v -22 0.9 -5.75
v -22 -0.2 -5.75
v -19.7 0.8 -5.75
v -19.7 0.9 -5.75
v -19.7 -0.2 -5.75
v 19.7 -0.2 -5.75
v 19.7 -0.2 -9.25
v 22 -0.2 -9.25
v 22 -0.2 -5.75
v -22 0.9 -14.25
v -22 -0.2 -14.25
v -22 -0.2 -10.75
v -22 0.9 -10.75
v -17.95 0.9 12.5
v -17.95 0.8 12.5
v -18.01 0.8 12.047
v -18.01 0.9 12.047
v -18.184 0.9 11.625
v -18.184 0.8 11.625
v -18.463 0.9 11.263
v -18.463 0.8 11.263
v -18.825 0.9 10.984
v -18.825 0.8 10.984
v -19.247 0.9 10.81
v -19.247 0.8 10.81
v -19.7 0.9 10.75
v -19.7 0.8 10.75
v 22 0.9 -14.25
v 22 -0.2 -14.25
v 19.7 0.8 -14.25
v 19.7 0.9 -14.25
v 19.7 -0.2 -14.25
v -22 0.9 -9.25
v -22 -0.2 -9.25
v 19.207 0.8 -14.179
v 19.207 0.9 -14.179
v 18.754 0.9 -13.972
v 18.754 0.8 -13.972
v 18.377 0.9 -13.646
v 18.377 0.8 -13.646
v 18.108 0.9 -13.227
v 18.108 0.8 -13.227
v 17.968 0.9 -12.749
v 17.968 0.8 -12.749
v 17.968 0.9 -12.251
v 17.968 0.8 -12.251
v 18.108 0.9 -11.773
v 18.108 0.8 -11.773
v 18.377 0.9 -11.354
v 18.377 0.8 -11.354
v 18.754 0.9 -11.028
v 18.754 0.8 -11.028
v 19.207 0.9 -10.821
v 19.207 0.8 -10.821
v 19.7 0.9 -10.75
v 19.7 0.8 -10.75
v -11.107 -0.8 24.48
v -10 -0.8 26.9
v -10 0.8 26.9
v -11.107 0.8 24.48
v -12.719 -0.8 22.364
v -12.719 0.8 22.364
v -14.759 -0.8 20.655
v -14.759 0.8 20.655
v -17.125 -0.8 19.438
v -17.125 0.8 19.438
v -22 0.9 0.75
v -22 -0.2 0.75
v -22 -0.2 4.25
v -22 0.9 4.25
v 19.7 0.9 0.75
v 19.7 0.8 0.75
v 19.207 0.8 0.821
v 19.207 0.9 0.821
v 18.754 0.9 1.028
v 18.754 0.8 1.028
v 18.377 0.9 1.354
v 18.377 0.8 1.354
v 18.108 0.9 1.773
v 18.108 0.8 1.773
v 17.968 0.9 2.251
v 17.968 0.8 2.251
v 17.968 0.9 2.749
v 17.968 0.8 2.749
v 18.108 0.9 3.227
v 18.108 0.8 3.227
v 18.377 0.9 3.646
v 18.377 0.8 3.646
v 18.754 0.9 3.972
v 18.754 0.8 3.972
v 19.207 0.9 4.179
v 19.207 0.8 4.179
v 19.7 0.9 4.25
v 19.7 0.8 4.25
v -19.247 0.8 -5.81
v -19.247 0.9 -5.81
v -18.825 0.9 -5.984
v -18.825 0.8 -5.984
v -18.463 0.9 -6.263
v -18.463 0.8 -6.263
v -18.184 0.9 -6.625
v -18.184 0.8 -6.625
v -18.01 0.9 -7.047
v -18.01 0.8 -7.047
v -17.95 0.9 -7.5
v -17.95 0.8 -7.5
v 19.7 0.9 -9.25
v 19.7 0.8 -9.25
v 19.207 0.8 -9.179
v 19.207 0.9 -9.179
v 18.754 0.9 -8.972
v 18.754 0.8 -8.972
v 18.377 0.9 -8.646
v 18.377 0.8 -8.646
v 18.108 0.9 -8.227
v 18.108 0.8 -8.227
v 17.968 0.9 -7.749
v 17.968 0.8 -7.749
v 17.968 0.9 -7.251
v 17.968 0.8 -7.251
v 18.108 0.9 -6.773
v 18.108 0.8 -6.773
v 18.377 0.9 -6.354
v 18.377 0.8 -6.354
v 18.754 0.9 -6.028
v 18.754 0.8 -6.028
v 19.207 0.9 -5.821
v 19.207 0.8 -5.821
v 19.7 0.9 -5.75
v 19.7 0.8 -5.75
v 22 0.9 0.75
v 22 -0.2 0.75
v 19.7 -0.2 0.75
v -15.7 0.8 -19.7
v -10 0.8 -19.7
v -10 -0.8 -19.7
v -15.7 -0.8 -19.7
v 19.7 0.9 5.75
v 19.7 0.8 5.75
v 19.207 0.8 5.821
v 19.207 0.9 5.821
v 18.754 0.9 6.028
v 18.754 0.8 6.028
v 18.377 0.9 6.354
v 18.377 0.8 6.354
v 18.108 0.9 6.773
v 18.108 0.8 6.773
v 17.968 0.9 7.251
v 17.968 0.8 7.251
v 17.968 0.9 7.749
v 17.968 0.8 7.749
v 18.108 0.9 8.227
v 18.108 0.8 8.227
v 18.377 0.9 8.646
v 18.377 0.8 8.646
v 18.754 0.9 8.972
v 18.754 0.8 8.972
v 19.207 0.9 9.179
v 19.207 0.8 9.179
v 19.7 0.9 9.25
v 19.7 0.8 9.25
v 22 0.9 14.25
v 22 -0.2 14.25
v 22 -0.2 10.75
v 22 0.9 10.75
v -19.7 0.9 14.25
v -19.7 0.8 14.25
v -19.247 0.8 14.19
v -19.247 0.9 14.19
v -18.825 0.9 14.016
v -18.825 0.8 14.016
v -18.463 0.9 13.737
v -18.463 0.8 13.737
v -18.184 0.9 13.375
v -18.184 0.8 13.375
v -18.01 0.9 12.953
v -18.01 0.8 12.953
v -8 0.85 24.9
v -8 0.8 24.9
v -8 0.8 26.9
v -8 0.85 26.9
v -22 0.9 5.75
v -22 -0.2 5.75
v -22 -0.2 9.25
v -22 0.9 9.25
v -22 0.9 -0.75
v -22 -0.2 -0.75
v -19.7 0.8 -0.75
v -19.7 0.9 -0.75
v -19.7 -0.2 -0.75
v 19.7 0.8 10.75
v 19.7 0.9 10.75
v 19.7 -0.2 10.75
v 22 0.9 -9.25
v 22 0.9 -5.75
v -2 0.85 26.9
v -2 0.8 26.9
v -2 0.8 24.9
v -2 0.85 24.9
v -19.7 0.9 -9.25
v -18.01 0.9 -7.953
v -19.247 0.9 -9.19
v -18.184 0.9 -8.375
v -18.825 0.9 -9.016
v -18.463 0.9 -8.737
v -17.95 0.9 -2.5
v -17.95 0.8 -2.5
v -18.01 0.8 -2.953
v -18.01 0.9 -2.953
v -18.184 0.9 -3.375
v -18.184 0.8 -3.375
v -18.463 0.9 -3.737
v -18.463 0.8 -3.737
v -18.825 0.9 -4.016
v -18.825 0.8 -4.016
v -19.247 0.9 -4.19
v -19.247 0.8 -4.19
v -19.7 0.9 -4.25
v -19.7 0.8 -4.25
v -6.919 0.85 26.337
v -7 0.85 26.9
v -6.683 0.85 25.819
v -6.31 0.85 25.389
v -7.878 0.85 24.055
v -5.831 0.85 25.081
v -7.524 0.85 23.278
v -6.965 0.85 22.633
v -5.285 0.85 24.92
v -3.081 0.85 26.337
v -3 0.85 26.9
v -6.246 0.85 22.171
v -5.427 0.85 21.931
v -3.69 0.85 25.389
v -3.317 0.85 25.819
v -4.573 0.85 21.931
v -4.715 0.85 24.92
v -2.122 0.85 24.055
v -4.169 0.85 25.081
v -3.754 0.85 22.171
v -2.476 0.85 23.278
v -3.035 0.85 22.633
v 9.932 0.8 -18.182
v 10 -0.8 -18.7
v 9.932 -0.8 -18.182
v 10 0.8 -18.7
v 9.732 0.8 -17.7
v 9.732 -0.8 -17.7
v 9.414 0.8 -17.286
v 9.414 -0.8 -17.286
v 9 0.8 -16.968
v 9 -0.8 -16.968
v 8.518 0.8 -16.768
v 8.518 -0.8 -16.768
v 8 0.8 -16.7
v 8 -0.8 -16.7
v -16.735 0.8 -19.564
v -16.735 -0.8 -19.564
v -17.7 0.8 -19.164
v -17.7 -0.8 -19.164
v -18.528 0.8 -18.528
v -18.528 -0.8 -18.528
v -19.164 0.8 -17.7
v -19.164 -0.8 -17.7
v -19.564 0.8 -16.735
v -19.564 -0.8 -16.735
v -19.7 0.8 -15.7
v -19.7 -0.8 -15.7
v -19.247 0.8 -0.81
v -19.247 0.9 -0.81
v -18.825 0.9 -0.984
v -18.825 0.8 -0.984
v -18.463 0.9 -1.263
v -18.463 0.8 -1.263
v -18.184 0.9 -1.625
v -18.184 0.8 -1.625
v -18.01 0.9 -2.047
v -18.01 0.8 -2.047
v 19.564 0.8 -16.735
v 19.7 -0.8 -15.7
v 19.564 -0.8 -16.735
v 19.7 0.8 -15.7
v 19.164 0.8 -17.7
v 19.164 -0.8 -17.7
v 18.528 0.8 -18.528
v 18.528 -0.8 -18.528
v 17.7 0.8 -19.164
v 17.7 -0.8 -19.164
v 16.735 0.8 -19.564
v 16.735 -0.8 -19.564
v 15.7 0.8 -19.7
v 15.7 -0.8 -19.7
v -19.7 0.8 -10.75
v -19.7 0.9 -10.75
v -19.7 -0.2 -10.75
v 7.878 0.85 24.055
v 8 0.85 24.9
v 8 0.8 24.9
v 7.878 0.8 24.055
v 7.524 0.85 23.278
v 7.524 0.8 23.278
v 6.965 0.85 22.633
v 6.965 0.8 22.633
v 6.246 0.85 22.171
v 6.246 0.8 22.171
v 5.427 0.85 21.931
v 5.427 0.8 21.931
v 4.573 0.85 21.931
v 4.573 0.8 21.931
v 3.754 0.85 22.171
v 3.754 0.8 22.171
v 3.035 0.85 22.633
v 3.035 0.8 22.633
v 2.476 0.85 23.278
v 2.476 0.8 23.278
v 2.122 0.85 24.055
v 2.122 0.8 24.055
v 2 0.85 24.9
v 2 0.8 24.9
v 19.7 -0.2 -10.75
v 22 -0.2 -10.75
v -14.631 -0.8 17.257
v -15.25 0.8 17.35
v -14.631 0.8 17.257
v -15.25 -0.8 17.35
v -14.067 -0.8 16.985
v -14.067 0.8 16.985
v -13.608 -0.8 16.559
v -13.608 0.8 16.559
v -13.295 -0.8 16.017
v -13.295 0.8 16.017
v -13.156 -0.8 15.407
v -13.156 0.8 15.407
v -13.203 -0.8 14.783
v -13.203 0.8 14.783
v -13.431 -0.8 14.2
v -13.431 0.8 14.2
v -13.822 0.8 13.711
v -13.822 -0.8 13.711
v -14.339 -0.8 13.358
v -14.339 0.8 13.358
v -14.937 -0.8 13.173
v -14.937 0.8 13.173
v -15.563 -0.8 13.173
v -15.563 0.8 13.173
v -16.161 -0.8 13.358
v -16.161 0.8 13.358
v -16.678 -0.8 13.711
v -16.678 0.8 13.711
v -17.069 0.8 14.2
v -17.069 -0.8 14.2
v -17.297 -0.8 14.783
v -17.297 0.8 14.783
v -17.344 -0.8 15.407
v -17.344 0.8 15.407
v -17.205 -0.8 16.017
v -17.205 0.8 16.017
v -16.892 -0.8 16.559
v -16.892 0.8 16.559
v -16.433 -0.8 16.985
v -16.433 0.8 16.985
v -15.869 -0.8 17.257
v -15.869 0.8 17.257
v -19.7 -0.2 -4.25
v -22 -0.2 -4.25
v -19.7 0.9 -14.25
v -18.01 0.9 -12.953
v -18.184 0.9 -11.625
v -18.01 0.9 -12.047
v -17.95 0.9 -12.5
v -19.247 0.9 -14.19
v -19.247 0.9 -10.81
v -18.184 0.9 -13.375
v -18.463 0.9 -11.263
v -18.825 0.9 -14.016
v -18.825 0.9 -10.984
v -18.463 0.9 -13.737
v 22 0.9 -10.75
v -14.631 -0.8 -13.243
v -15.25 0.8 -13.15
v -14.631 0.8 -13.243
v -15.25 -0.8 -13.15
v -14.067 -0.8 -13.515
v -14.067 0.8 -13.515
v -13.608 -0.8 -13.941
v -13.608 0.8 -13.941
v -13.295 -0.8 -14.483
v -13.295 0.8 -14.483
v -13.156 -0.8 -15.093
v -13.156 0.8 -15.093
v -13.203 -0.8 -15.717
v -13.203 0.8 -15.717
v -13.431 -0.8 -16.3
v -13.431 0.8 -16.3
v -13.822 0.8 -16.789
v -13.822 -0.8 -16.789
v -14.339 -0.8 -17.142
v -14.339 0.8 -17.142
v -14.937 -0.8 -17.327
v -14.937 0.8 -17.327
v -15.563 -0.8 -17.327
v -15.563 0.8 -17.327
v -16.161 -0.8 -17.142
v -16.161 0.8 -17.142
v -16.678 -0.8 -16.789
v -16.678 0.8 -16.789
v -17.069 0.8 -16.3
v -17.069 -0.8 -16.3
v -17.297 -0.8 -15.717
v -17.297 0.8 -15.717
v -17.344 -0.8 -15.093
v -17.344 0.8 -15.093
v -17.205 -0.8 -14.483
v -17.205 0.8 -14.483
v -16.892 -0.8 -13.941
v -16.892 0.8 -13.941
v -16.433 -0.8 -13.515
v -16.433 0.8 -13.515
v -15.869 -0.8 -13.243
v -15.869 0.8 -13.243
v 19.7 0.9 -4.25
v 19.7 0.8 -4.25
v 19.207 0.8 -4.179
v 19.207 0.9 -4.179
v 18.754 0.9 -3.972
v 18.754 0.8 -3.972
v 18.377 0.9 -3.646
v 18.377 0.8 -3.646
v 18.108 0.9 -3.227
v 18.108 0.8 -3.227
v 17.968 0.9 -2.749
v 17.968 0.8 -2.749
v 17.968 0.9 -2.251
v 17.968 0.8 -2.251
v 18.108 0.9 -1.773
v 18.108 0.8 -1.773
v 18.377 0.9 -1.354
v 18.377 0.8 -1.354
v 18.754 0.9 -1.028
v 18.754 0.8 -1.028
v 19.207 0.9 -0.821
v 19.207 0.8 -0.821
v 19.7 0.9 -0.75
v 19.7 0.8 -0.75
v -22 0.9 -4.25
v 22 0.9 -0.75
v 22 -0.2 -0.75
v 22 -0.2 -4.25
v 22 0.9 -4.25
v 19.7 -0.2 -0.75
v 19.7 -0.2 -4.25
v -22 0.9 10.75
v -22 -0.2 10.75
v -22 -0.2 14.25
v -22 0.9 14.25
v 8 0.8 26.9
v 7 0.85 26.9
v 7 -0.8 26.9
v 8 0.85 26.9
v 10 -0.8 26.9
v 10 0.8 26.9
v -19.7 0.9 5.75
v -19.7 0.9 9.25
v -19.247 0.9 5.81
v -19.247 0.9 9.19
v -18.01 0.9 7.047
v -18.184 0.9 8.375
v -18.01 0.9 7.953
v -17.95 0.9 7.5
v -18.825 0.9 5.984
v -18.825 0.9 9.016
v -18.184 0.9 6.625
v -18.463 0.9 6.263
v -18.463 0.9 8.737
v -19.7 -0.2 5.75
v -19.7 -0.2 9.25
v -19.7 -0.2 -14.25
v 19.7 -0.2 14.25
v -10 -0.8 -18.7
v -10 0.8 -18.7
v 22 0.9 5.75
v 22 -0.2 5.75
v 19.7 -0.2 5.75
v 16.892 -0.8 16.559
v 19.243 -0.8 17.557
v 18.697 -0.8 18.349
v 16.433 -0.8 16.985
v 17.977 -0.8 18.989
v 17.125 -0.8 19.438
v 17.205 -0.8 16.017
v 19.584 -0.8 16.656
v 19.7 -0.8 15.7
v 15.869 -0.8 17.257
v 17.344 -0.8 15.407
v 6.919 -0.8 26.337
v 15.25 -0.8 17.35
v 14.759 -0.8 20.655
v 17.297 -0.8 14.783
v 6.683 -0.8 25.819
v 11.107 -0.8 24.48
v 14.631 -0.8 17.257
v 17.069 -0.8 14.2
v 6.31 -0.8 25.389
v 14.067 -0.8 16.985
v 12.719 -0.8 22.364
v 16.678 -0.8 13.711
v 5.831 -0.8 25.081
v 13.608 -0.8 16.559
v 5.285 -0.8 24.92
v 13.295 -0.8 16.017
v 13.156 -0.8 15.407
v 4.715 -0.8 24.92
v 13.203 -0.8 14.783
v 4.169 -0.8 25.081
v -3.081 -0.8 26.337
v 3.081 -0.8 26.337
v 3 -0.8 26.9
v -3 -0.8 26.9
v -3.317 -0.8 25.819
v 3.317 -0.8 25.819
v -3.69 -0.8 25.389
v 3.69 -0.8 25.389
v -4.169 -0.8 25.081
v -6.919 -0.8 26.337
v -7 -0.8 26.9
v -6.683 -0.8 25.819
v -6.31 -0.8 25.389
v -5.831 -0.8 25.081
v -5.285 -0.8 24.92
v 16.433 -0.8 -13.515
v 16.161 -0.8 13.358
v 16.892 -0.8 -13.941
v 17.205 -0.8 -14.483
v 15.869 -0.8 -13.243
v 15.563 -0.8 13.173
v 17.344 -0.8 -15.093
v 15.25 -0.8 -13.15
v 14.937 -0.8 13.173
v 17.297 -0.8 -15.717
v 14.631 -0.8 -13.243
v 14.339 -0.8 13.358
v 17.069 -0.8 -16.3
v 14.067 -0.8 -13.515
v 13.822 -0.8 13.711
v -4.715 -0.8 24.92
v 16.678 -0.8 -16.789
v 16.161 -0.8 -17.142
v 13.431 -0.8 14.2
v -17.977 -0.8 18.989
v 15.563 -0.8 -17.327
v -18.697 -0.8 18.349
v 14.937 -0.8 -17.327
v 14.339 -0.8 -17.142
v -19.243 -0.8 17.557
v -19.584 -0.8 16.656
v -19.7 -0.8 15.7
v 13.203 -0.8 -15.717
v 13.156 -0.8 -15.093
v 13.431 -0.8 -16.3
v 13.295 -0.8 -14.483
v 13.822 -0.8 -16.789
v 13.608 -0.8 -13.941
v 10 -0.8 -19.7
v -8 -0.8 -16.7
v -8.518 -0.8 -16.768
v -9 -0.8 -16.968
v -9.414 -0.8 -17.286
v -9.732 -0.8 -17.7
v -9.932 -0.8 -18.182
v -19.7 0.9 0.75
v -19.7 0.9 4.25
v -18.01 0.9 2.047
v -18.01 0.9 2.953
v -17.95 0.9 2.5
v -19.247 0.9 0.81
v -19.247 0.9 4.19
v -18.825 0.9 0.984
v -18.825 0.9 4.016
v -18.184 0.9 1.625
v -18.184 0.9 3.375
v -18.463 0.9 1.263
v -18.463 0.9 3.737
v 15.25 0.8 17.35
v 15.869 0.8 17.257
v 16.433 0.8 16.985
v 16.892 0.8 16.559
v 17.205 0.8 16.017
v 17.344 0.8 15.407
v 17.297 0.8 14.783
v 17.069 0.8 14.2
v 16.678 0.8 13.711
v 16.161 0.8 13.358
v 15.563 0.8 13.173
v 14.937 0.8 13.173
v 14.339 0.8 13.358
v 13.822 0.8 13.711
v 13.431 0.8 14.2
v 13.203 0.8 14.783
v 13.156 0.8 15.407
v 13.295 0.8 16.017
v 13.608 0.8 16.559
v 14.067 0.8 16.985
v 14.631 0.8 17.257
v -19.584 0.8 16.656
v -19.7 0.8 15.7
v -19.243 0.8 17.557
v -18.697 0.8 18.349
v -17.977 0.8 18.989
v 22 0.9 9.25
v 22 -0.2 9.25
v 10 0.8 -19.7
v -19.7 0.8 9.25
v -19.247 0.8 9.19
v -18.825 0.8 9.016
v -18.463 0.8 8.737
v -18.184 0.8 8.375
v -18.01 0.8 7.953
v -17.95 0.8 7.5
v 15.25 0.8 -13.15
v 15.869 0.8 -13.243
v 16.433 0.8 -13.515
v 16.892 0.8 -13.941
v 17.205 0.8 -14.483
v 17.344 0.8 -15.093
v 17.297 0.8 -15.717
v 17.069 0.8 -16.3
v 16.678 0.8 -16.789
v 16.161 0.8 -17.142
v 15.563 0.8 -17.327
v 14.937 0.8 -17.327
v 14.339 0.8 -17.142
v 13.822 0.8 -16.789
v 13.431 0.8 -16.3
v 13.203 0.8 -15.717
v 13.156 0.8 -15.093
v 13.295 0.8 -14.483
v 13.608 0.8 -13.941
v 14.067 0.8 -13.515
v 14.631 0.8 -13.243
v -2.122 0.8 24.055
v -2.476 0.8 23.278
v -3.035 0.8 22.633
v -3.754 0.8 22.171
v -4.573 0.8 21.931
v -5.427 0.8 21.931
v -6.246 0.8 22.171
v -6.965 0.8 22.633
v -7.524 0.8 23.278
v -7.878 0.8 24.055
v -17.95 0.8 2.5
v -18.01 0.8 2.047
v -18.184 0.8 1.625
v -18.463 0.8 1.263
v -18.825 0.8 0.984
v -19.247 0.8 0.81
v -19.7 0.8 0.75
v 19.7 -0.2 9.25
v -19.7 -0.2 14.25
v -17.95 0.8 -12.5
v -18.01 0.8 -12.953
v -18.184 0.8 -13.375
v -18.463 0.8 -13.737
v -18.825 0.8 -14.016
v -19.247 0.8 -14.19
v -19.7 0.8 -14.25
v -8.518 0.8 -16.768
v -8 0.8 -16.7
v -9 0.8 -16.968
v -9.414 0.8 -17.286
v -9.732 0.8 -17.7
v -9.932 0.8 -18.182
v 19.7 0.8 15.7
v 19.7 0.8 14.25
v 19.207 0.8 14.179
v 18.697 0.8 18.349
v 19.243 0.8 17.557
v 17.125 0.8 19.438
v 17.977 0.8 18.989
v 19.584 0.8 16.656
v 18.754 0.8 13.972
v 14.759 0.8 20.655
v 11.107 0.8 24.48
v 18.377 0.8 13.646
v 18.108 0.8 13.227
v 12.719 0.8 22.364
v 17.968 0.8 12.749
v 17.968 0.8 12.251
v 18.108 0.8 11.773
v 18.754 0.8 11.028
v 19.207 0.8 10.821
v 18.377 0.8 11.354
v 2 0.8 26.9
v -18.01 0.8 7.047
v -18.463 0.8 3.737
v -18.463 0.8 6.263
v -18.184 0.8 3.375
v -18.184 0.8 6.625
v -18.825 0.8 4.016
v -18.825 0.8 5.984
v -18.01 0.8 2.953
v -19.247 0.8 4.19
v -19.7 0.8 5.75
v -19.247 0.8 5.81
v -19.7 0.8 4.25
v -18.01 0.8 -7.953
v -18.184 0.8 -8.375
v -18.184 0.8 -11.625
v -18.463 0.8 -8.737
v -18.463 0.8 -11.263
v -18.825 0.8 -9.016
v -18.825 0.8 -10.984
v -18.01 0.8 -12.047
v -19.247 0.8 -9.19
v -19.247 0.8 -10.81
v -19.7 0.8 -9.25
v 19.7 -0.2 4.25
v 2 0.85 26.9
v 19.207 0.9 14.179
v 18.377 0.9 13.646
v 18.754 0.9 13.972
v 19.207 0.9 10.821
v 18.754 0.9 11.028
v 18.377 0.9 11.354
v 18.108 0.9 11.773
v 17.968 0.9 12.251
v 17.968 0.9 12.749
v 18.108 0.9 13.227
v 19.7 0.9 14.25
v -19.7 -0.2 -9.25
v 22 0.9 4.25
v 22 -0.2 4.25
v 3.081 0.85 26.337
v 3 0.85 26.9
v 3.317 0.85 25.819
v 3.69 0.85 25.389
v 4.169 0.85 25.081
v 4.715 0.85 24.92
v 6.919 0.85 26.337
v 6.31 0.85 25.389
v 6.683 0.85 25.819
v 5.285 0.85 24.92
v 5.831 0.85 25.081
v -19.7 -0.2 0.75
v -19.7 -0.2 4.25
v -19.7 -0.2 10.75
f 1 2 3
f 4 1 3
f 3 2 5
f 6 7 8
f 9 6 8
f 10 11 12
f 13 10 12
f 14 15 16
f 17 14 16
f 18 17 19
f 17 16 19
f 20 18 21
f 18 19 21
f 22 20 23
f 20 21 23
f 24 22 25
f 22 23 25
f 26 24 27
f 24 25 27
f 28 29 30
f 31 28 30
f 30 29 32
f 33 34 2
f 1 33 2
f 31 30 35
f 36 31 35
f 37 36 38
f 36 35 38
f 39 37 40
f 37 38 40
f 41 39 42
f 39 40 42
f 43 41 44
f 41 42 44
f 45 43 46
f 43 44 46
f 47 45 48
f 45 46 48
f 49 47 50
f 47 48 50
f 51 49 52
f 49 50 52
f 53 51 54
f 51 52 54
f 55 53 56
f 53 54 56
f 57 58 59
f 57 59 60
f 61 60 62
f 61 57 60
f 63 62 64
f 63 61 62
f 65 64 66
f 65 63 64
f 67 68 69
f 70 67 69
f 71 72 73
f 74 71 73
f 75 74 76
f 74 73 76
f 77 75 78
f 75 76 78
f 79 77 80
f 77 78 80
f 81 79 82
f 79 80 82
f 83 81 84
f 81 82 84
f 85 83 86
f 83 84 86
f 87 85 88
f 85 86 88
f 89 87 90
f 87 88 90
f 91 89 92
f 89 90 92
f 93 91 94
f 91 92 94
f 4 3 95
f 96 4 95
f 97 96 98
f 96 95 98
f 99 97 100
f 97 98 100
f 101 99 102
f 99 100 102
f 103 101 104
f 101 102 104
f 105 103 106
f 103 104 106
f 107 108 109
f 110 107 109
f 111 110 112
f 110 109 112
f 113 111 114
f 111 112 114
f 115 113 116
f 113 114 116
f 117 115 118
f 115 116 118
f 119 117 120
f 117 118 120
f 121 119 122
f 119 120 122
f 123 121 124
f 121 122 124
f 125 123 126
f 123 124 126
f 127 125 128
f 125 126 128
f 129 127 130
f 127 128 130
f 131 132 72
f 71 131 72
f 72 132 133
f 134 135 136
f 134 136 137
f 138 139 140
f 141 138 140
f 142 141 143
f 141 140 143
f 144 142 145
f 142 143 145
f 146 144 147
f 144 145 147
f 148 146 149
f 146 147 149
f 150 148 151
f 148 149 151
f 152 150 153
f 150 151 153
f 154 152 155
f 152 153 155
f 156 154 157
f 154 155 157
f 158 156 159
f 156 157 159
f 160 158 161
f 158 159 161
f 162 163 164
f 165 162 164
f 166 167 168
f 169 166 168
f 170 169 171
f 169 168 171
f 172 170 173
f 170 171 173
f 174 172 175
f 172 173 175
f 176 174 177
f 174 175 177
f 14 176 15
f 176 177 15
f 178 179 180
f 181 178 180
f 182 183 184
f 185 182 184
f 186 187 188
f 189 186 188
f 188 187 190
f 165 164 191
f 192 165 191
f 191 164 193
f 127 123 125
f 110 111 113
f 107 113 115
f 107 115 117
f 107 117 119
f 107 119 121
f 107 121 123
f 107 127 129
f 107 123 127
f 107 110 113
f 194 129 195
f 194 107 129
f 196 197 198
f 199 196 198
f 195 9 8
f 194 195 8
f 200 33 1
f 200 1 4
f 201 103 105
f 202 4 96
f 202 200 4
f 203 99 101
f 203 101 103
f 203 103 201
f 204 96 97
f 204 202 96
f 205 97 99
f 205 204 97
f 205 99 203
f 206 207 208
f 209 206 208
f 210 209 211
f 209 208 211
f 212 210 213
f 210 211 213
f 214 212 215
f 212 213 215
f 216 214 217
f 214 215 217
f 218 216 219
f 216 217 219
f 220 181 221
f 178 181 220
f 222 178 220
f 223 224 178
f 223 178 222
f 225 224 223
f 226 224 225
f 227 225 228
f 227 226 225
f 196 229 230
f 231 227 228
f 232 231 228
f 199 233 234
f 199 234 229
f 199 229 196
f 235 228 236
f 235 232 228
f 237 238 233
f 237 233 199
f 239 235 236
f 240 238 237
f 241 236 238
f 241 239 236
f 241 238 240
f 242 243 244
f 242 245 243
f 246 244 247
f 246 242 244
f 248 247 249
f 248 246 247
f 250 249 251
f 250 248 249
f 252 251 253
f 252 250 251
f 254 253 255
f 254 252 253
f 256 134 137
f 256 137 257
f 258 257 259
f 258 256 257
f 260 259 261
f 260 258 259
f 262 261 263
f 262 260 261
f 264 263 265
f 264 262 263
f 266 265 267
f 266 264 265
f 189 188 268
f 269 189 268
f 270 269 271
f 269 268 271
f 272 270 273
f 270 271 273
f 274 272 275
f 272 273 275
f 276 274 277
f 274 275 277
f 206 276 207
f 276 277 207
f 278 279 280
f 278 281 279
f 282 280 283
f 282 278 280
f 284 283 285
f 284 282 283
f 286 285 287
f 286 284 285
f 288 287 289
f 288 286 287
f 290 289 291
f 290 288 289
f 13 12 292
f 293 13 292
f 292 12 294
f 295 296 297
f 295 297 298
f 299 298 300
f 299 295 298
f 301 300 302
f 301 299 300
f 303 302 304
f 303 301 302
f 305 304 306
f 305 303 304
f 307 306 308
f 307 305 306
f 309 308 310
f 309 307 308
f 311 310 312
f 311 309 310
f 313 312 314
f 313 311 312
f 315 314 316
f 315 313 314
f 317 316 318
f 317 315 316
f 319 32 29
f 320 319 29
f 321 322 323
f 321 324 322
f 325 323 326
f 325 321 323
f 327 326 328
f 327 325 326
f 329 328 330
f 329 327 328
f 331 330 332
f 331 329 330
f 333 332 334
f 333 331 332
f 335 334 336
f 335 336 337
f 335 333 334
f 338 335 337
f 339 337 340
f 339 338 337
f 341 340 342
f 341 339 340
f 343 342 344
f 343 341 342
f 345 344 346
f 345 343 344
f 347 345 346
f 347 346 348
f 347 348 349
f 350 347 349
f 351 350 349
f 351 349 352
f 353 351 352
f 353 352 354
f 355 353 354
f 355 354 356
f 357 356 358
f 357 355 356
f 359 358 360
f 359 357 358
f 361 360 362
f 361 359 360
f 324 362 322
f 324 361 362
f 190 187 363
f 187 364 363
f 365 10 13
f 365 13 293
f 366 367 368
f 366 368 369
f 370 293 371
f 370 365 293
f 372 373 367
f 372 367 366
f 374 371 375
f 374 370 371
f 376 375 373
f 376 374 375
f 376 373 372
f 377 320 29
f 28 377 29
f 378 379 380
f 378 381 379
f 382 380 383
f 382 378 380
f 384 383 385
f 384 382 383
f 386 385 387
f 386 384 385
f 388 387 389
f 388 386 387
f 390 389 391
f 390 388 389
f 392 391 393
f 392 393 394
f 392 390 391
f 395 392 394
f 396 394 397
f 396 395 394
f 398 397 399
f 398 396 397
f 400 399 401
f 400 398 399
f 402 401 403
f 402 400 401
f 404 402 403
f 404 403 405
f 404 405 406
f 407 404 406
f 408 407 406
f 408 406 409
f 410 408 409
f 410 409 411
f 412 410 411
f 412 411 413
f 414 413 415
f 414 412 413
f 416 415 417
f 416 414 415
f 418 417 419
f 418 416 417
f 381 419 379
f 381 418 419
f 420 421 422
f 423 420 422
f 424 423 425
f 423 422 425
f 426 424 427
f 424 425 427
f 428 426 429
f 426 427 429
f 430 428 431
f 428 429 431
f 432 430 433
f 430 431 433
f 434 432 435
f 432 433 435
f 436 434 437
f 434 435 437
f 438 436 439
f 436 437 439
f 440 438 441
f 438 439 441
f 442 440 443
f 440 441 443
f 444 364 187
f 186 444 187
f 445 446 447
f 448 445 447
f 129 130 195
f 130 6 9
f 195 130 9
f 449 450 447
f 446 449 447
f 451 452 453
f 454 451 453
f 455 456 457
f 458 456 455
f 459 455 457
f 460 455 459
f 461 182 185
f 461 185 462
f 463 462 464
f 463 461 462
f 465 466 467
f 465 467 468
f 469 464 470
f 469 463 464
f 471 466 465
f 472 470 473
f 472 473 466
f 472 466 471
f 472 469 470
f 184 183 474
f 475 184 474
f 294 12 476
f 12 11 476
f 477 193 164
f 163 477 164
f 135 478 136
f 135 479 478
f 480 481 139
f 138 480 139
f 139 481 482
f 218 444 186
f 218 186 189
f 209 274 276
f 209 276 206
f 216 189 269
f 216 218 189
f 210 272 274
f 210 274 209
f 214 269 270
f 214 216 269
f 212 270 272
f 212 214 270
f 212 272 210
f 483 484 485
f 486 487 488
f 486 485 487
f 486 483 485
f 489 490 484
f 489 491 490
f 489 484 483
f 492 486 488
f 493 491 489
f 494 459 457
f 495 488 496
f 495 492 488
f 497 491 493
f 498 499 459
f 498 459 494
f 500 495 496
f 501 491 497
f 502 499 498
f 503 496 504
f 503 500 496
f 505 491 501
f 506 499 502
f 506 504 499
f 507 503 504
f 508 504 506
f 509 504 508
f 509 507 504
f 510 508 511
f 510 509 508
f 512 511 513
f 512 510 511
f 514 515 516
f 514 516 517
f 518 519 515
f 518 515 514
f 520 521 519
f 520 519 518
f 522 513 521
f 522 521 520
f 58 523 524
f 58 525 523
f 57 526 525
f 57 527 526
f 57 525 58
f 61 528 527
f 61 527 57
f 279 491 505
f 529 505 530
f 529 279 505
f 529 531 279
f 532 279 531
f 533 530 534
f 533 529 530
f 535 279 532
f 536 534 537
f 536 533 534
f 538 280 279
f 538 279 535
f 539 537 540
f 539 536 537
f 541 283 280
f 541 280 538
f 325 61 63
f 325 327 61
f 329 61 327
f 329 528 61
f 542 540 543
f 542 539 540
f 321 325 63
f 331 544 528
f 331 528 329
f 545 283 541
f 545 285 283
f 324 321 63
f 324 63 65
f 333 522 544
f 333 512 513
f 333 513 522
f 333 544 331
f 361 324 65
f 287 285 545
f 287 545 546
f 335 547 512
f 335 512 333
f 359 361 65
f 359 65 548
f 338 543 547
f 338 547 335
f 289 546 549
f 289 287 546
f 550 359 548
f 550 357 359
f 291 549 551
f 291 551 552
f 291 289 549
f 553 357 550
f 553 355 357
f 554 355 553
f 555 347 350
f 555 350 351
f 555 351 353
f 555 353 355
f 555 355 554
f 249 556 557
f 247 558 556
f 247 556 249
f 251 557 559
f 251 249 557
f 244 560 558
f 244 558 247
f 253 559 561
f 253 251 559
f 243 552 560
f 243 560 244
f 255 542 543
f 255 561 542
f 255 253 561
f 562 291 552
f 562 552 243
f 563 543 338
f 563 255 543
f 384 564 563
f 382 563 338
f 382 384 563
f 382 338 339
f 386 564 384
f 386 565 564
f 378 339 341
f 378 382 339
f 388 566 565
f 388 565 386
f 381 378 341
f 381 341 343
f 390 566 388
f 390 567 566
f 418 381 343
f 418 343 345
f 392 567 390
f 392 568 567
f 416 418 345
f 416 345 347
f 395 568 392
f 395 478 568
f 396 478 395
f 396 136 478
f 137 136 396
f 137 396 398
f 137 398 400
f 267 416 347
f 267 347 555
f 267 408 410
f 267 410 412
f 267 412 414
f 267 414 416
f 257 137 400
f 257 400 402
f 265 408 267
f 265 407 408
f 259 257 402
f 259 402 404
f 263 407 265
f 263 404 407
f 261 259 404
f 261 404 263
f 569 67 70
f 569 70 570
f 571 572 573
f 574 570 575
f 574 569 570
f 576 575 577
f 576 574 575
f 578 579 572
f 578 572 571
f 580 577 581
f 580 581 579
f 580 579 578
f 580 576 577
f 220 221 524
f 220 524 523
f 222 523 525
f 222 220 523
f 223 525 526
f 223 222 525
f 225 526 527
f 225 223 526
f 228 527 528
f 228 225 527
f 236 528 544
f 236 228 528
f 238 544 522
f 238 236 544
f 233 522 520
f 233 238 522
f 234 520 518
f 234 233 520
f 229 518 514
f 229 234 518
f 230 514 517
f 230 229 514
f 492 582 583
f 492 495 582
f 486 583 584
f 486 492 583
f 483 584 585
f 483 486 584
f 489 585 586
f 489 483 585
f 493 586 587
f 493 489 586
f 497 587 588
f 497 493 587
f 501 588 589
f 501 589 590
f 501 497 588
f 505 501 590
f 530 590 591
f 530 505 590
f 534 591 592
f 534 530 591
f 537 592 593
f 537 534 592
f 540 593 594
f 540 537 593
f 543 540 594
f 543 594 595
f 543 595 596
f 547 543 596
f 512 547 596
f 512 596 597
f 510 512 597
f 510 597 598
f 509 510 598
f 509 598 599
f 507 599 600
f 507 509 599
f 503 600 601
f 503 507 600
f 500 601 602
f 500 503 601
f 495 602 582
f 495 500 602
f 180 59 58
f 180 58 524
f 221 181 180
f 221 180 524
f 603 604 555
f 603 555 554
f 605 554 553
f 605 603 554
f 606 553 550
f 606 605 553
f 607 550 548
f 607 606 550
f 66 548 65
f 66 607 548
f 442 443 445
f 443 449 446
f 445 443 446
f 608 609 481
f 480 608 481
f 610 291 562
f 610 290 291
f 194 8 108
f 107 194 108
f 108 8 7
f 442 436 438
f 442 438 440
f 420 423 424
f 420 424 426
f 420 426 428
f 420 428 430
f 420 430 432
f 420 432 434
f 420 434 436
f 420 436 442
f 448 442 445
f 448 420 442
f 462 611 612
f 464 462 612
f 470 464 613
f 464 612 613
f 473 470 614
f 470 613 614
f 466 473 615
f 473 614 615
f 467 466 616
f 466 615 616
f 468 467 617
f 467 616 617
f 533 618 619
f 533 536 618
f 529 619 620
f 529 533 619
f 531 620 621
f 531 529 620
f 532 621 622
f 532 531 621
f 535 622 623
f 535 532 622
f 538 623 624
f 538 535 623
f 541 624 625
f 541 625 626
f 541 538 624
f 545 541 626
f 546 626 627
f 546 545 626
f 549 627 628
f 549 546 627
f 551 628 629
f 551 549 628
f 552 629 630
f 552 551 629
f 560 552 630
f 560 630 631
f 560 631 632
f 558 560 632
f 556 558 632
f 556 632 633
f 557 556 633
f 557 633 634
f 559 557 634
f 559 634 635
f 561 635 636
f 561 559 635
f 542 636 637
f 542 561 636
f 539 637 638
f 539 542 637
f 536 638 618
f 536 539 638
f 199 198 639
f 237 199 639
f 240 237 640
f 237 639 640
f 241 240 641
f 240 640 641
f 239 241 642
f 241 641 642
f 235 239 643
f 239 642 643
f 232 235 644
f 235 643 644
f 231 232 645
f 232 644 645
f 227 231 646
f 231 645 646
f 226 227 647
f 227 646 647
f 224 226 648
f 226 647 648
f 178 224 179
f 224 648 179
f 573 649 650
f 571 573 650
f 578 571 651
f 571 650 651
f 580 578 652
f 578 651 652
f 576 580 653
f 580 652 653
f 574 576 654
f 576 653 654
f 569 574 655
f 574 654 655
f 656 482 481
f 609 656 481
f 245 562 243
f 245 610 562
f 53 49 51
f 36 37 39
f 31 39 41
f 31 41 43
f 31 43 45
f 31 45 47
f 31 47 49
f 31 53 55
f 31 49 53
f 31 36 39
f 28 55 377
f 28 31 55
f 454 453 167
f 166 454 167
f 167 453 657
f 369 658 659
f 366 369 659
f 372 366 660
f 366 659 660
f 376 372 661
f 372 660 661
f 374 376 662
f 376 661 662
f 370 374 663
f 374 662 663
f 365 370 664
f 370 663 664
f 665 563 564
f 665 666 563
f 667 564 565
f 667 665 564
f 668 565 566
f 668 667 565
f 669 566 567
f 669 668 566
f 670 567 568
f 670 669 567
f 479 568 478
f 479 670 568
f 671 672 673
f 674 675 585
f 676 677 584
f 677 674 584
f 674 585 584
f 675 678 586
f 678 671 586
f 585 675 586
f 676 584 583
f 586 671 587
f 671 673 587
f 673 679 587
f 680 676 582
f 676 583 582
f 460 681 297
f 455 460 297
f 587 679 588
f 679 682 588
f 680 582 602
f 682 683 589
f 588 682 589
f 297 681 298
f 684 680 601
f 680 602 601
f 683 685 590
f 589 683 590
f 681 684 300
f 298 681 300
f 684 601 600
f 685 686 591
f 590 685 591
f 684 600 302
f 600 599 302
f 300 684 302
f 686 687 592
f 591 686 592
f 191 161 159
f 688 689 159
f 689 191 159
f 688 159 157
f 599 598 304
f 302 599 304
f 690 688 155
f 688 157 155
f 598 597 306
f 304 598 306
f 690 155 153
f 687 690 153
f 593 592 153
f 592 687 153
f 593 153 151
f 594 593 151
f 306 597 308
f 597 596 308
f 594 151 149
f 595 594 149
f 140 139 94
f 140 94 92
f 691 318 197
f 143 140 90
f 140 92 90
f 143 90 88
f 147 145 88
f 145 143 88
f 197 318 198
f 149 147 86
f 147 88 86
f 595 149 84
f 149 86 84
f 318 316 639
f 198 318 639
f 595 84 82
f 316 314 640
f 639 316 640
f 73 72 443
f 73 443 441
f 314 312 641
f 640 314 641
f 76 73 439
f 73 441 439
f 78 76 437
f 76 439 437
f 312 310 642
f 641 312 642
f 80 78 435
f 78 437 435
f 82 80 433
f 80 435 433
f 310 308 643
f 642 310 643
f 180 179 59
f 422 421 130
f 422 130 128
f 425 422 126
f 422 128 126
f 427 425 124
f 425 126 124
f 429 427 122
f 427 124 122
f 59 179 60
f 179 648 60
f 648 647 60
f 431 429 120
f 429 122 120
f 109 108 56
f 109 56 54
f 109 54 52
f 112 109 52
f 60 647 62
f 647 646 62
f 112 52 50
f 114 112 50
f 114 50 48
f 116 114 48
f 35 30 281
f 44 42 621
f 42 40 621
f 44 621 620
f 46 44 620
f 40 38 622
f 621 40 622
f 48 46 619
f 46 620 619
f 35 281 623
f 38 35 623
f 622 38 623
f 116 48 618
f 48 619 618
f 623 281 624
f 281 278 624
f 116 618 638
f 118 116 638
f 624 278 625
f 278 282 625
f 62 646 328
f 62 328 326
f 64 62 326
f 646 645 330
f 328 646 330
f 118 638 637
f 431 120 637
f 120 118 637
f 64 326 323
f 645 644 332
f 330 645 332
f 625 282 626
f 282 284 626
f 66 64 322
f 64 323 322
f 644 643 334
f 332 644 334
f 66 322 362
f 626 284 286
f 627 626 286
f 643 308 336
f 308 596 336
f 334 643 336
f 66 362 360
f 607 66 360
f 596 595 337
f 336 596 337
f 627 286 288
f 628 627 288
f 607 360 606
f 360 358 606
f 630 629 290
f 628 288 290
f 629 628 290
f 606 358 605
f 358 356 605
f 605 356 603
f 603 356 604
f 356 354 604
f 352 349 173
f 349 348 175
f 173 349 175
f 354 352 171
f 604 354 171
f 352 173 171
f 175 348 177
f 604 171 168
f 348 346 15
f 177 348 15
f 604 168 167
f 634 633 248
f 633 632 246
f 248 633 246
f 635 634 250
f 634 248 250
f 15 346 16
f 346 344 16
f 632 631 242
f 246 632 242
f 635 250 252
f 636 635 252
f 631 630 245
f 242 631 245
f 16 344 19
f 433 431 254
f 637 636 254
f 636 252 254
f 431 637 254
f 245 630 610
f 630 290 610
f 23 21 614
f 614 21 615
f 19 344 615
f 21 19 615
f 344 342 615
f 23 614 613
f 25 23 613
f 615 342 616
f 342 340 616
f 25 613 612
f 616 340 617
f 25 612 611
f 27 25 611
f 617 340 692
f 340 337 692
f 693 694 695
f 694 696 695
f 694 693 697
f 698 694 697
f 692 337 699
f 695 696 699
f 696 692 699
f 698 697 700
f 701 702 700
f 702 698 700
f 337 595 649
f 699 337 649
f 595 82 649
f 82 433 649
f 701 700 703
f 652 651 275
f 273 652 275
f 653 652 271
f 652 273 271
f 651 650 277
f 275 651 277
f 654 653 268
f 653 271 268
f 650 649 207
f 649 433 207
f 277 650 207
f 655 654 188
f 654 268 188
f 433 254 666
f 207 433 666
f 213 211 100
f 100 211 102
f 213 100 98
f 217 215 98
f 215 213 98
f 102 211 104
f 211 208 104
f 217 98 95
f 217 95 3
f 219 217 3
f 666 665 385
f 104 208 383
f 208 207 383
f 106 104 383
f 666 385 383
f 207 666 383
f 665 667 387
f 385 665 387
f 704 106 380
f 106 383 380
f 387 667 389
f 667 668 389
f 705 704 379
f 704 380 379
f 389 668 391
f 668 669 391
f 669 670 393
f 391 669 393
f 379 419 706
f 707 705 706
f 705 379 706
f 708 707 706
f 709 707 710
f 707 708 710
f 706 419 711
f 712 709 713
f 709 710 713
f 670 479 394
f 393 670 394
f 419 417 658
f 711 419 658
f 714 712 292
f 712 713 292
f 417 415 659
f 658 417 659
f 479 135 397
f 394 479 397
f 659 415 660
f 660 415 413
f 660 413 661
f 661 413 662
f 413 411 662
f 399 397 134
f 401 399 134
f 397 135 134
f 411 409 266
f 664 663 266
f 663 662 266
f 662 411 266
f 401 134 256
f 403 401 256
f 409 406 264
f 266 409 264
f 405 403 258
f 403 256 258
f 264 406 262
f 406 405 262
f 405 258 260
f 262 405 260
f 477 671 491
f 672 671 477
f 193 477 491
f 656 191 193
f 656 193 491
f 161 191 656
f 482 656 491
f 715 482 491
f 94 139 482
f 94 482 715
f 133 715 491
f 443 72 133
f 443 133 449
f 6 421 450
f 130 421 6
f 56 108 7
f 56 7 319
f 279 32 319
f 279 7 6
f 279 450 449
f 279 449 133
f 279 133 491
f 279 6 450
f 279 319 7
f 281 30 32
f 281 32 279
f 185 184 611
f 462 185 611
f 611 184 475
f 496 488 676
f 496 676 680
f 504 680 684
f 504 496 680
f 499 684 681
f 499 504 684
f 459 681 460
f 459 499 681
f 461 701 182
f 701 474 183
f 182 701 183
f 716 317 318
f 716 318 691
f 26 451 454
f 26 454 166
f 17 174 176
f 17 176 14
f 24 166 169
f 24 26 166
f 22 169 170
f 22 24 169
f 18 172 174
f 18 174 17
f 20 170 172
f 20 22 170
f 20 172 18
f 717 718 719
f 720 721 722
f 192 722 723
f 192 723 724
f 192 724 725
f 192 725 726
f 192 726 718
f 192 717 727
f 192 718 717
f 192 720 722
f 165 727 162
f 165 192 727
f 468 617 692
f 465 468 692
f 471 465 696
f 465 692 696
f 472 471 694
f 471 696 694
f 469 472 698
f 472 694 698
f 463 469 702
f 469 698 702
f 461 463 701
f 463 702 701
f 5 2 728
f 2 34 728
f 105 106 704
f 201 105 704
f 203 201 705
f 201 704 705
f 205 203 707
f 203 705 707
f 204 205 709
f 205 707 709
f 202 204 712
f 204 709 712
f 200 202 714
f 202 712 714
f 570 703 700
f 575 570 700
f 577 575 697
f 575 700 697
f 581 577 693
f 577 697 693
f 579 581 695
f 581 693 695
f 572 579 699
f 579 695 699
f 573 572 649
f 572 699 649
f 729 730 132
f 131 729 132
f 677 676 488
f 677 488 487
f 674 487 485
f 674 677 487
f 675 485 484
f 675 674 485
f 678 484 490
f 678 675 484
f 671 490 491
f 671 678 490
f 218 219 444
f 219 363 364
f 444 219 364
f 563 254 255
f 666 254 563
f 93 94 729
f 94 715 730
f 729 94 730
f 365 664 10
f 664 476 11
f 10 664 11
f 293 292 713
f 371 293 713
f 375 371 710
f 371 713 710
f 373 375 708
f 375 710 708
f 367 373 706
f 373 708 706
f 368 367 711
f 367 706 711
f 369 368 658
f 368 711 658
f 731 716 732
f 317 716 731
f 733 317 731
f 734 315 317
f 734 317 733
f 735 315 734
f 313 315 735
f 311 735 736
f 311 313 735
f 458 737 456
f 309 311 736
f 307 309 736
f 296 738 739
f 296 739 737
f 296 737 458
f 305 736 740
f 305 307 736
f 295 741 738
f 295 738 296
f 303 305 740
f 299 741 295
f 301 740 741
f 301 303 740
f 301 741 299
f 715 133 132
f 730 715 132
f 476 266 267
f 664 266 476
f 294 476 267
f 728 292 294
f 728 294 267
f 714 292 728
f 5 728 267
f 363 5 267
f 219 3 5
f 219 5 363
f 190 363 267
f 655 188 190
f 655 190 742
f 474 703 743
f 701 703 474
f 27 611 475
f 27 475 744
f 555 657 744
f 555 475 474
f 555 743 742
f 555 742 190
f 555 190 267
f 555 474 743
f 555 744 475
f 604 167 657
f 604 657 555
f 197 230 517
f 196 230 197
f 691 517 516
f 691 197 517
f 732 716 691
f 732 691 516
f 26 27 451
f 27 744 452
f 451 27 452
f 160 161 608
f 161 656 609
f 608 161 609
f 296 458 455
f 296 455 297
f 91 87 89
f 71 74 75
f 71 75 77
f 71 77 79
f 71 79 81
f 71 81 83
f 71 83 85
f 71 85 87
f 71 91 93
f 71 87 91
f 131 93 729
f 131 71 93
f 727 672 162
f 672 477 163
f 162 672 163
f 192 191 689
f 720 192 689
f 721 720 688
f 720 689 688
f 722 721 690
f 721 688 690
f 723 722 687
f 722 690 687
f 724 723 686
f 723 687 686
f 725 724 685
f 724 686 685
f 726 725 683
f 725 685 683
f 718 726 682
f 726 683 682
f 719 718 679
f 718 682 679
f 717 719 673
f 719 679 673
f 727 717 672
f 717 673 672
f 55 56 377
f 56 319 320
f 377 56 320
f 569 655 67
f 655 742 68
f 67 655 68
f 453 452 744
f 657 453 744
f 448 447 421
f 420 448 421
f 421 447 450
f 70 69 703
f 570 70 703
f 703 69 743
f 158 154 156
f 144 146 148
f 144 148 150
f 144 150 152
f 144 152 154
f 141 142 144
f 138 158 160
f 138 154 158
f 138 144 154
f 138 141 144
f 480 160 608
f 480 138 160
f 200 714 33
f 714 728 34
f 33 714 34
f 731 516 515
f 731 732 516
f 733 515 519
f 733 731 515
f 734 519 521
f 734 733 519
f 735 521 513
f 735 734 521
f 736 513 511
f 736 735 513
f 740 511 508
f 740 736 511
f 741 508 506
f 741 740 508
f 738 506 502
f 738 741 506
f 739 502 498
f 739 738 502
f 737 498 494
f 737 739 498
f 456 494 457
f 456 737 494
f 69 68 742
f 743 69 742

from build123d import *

# Parameters (mm, degrees)
SKETCH1_R                = 2.1
BOSS_EXTRUDE1_DEPTH      = 0.8
FILLET1_R                = 12
BOSS_EXTRUDE3_DEPTH      = 0.05
BOSS_EXTRUDE4_DEPTH      = 0.1
BOSS_EXTRUDE4_DEPTH_BACK = 1


with BuildPart() as part:
    # Sketch1 → Boss-Extrude1 (new, symmetric)
    with BuildSketch(Plane(origin=(0, 0, 0), x_dir=(1, 0, 0), z_dir=(0, 1, 0))):
        with BuildLine():
            Line((-10, 18.7), (-10, 19.7))
            Line((-10, 19.7), (-15.7, 19.7))
            ThreePointArc((-15.7, 19.7), (-18.528427125, 18.528427125), (-19.7, 15.7))
            Line((-19.7, 15.7), (-19.7, -15.7))
            ThreePointArc((-19.7, -15.7), (-18.528427125, -18.528427125), (-15.7, -19.7))
            Line((-15.7, -19.7), (-10, -19.7))
            Line((-10, -19.7), (-10, -26.9))
            Line((-10, -26.9), (-7, -26.9))
            ThreePointArc((-7, -26.9), (-5, -24.9), (-3, -26.9))
            Line((-3, -26.9), (3, -26.9))
            ThreePointArc((3, -26.9), (5, -24.9), (7, -26.9))
            Line((7, -26.9), (10, -26.9))
            Line((10, -26.9), (10, -19.7))
            Line((10, -19.7), (15.7, -19.7))
            ThreePointArc((15.7, -19.7), (18.528427125, -18.528427125), (19.7, -15.7))
            Line((19.7, -15.7), (19.7, 15.7))
            ThreePointArc((19.7, 15.7), (18.528427125, 18.528427125), (15.7, 19.7))
            Line((15.7, 19.7), (10, 19.7))
            Line((10, 19.7), (10, 18.7))
            ThreePointArc((10, 18.7), (9.414213562, 17.285786438), (8, 16.7))
            Line((8, 16.7), (-8, 16.7))
            ThreePointArc((-8, 16.7), (-9.414213562, 17.285786438), (-10, 18.7))
        make_face()
        with Locations(Location((-15.25, -15.25, 0), (0, 0, 270))):
            Circle(SKETCH1_R, mode=Mode.SUBTRACT)
        with Locations(Location((15.25, -15.25, 0), (0, 0, 270))):
            Circle(SKETCH1_R, mode=Mode.SUBTRACT)
        with Locations(Location((-15.25, 15.25, 0), (0, 0, 270))):
            Circle(SKETCH1_R, mode=Mode.SUBTRACT)
        with Locations(Location((15.25, 15.25, 0), (0, 0, 270))):
            Circle(SKETCH1_R, mode=Mode.SUBTRACT)
    extrude(amount=BOSS_EXTRUDE1_DEPTH, both=True)

    # Fillet1
    # the kernel refuses this fillet: 12 mm, written as the material it adds along each edge
    with BuildSketch(Plane(origin=(-10, -0.8, 19.7), x_dir=(0, 0, 1), z_dir=(0, 1, 0))) as fillet1_piece_1:
        with BuildLine():
            CenterArc((10.950716979, -11.398777221), FILLET1_R, 108.21356071, 50.921051977)
            Line((-0.262320755, -7.124694305), (-1.383624529, -6.697286014))
            ThreePointArc((-1.383624529, -6.697286014), (-1.2, -5.7), (-1.2, 0))
            Line((-1.2, 0), (0, 1.2))
            ThreePointArc((0, 1.2), (3.6, 1.2), (6.824928302, 1.139877722))
            Line((6.824928302, 1.139877722), (7.2, 0))
        make_face()
    extrude(amount=1.6)
    with BuildSketch(Plane(origin=(10, -0.8, 19.7), x_dir=(0.9993228863513164, 0, -0.03679359746578182), z_dir=(0, 1, 0))) as fillet1_piece_2:
        with BuildLine():
            CenterArc((10.988142681, -11.36270412), FILLET1_R, 108.756793525, 50.921051977)
            Line((-0.264913902, -7.195124782), (-1.39021956, -6.778366848))
            ThreePointArc((-1.39021956, -6.778366848), (-1.331644414, -3.553410074), (-1.199187464, 0.044152317))
            Line((-1.199187464, 0.044152317), (0.044152317, 1.199187464))
            ThreePointArc((0.044152317, 1.199187464), (5.740292769, 0.989463958), (6.743659714, 1.136270412))
            Line((6.743659714, 1.136270412), (7.129521802, 0))
        make_face()
    extrude(amount=1.6)

    # Sketch4 → Boss-Extrude3 (add, symmetric)
    with BuildSketch(Plane(origin=(0, 0.8, 0), x_dir=(1, 0, 0), z_dir=(0, 1, 0))):
        with BuildLine():
            Line((-8, -24.9), (-8, -26.9))
            Line((-8, -26.9), (-7, -26.9))
            ThreePointArc((-7, -26.9), (-5, -24.9), (-3, -26.9))
            Line((-3, -26.9), (-2, -26.9))
            Line((-2, -26.9), (-2, -24.9))
            ThreePointArc((-2, -24.9), (-5, -21.9), (-8, -24.9))
        make_face()
        with BuildLine():
            Line((2, -24.9), (2, -26.9))
            Line((2, -26.9), (3, -26.9))
            ThreePointArc((3, -26.9), (5, -24.9), (7, -26.9))
            Line((7, -26.9), (8, -26.9))
            Line((8, -26.9), (8, -24.9))
            ThreePointArc((8, -24.9), (5, -21.9), (2, -24.9))
        make_face()
    extrude(amount=BOSS_EXTRUDE3_DEPTH, both=True)

    # Sketch5 → Boss-Extrude4 (add, two sides: drawn at the far end of the back side and taken through both)
    with BuildSketch(Plane(origin=(0, 0.8, 0), x_dir=(1, 0, 0), z_dir=(0, 1, 0)).offset(-BOSS_EXTRUDE4_DEPTH_BACK)):
        with BuildLine():
            ThreePointArc((-17.95, -12.5), (-18.462563133, -11.262563133), (-19.7, -10.75))
            Line((-19.7, -10.75), (-19.7, -14.25))
            ThreePointArc((-19.7, -14.25), (-18.462563133, -13.737436867), (-17.95, -12.5))
        make_face()
        with BuildLine():
            Line((-19.7, -14.25), (-19.7, -10.75))
            ThreePointArc((-19.7, -10.75), (-21.45, -12.5), (-19.7, -14.25))
        make_face()
        with BuildLine():
            ThreePointArc((-19.7, -14.25), (-21.45, -12.5), (-19.7, -10.75))
            Line((-19.7, -10.75), (-22, -10.75))
            Line((-22, -10.75), (-22, -14.25))
            Line((-22, -14.25), (-19.7, -14.25))
        make_face()
        with BuildLine():
            ThreePointArc((-17.95, -7.5), (-18.462563133, -6.262563133), (-19.7, -5.75))
            Line((-19.7, -5.75), (-19.7, -9.25))
            ThreePointArc((-19.7, -9.25), (-18.462563133, -8.737436867), (-17.95, -7.5))
        make_face()
        with BuildLine():
            Line((-19.7, -9.25), (-19.7, -5.75))
            ThreePointArc((-19.7, -5.75), (-21.45, -7.5), (-19.7, -9.25))
        make_face()
        with BuildLine():
            ThreePointArc((-19.7, -9.25), (-21.45, -7.5), (-19.7, -5.75))
            Line((-19.7, -5.75), (-22, -5.75))
            Line((-22, -5.75), (-22, -9.25))
            Line((-22, -9.25), (-19.7, -9.25))
        make_face()
        with BuildLine():
            ThreePointArc((-17.95, -2.5), (-18.462563133, -1.262563133), (-19.7, -0.75))
            Line((-19.7, -0.75), (-19.7, -4.25))
            ThreePointArc((-19.7, -4.25), (-18.462563133, -3.737436867), (-17.95, -2.5))
        make_face()
        with BuildLine():
            Line((-19.7, -4.25), (-19.7, -0.75))
            ThreePointArc((-19.7, -0.75), (-21.45, -2.5), (-19.7, -4.25))
        make_face()
        with BuildLine():
            ThreePointArc((-19.7, -4.25), (-21.45, -2.5), (-19.7, -0.75))
            Line((-19.7, -0.75), (-22, -0.75))
            Line((-22, -0.75), (-22, -4.25))
            Line((-22, -4.25), (-19.7, -4.25))
        make_face()
        with BuildLine():
            Line((-19.7, 0.75), (-19.7, 4.25))
            ThreePointArc((-19.7, 4.25), (-21.45, 2.5), (-19.7, 0.75))
        make_face()
        with BuildLine():
            ThreePointArc((-17.95, 2.5), (-18.462563133, 3.737436867), (-19.7, 4.25))
            Line((-19.7, 4.25), (-19.7, 0.75))
            ThreePointArc((-19.7, 0.75), (-18.462563133, 1.262563133), (-17.95, 2.5))
        make_face()
        with BuildLine():
            ThreePointArc((-19.7, 0.75), (-21.45, 2.5), (-19.7, 4.25))
            Line((-19.7, 4.25), (-22, 4.25))
            Line((-22, 4.25), (-22, 0.75))
            Line((-22, 0.75), (-19.7, 0.75))
        make_face()
        with BuildLine():
            ThreePointArc((-19.7, 9.25), (-21.45, 7.5), (-19.7, 5.75))
            Line((-19.7, 5.75), (-19.7, 9.25))
        make_face()
        with BuildLine():
            Line((-19.7, 9.25), (-19.7, 5.75))
            ThreePointArc((-19.7, 5.75), (-18.462563133, 6.262563133), (-17.95, 7.5))
            ThreePointArc((-17.95, 7.5), (-18.462563133, 8.737436867), (-19.7, 9.25))
        make_face()
        with BuildLine():
            Line((-22, 5.75), (-19.7, 5.75))
            ThreePointArc((-19.7, 5.75), (-21.45, 7.5), (-19.7, 9.25))
            Line((-19.7, 9.25), (-22, 9.25))
            Line((-22, 9.25), (-22, 5.75))
        make_face()
        with BuildLine():
            ThreePointArc((-19.7, 14.25), (-21.45, 12.5), (-19.7, 10.75))
            Line((-19.7, 10.75), (-19.7, 14.25))
        make_face()
        with BuildLine():
            Line((-19.7, 14.25), (-19.7, 10.75))
            ThreePointArc((-19.7, 10.75), (-18.462563133, 11.262563133), (-17.95, 12.5))
            ThreePointArc((-17.95, 12.5), (-18.462563133, 13.737436867), (-19.7, 14.25))
        make_face()
        with BuildLine():
            Line((-22, 10.75), (-19.7, 10.75))
            ThreePointArc((-19.7, 10.75), (-21.45, 12.5), (-19.7, 14.25))
            Line((-19.7, 14.25), (-22, 14.25))
            Line((-22, 14.25), (-22, 10.75))
        make_face()
        with BuildLine():
            ThreePointArc((21.45, -12.5), (20.937436867, -11.262563133), (19.7, -10.75))
            Line((19.7, -10.75), (19.7, -14.25))
            ThreePointArc((19.7, -14.25), (20.937436867, -13.737436867), (21.45, -12.5))
        make_face()
        with BuildLine():
            Line((19.7, -14.25), (19.7, -10.75))
            ThreePointArc((19.7, -10.75), (17.95, -12.5), (19.7, -14.25))
        make_face()
        with BuildLine():
            Line((22, -10.75), (19.7, -10.75))
            ThreePointArc((19.7, -10.75), (20.937436867, -11.262563133), (21.45, -12.5))
            ThreePointArc((21.45, -12.5), (20.937436867, -13.737436867), (19.7, -14.25))
            Line((19.7, -14.25), (22, -14.25))
            Line((22, -14.25), (22, -10.75))
        make_face()
        with BuildLine():
            Line((22, -5.75), (19.7, -5.75))
            ThreePointArc((19.7, -5.75), (20.937436867, -6.262563133), (21.45, -7.5))
            ThreePointArc((21.45, -7.5), (20.937436867, -8.737436867), (19.7, -9.25))
            Line((19.7, -9.25), (22, -9.25))
            Line((22, -9.25), (22, -5.75))
        make_face()
        with BuildLine():
            ThreePointArc((21.45, -7.5), (20.937436867, -6.262563133), (19.7, -5.75))
            Line((19.7, -5.75), (19.7, -9.25))
            ThreePointArc((19.7, -9.25), (20.937436867, -8.737436867), (21.45, -7.5))
        make_face()
        with BuildLine():
            Line((19.7, -9.25), (19.7, -5.75))
            ThreePointArc((19.7, -5.75), (17.95, -7.5), (19.7, -9.25))
        make_face()
        with BuildLine():
            Line((19.7, -0.75), (19.7, -4.25))
            ThreePointArc((19.7, -4.25), (20.937436867, -3.737436867), (21.45, -2.5))
            ThreePointArc((21.45, -2.5), (20.937436867, -1.262563133), (19.7, -0.75))
        make_face()
        with BuildLine():
            ThreePointArc((19.7, -0.75), (17.95, -2.5), (19.7, -4.25))
            Line((19.7, -4.25), (19.7, -0.75))
        make_face()
        with BuildLine():
            ThreePointArc((21.45, -2.5), (20.937436867, -3.737436867), (19.7, -4.25))
            Line((19.7, -4.25), (22, -4.25))
            Line((22, -4.25), (22, -0.75))
            Line((22, -0.75), (19.7, -0.75))
            ThreePointArc((19.7, -0.75), (20.937436867, -1.262563133), (21.45, -2.5))
        make_face()
        with BuildLine():
            ThreePointArc((19.7, 4.25), (17.95, 2.5), (19.7, 0.75))
            Line((19.7, 0.75), (19.7, 4.25))
        make_face()
        with BuildLine():
            Line((19.7, 4.25), (19.7, 0.75))
            ThreePointArc((19.7, 0.75), (20.937436867, 1.262563133), (21.45, 2.5))
            ThreePointArc((21.45, 2.5), (20.937436867, 3.737436867), (19.7, 4.25))
        make_face()
        with BuildLine():
            ThreePointArc((21.45, 2.5), (20.937436867, 1.262563133), (19.7, 0.75))
            Line((19.7, 0.75), (22, 0.75))
            Line((22, 0.75), (22, 4.25))
            Line((22, 4.25), (19.7, 4.25))
            ThreePointArc((19.7, 4.25), (20.937436867, 3.737436867), (21.45, 2.5))
        make_face()
        with BuildLine():
            ThreePointArc((19.7, 9.25), (17.95, 7.5), (19.7, 5.75))
            Line((19.7, 5.75), (19.7, 9.25))
        make_face()
        with BuildLine():
            Line((19.7, 9.25), (19.7, 5.75))
            ThreePointArc((19.7, 5.75), (20.937436867, 6.262563133), (21.45, 7.5))
            ThreePointArc((21.45, 7.5), (20.937436867, 8.737436867), (19.7, 9.25))
        make_face()
        with BuildLine():
            ThreePointArc((21.45, 7.5), (20.937436867, 6.262563133), (19.7, 5.75))
            Line((19.7, 5.75), (22, 5.75))
            Line((22, 5.75), (22, 9.25))
            Line((22, 9.25), (19.7, 9.25))
            ThreePointArc((19.7, 9.25), (20.937436867, 8.737436867), (21.45, 7.5))
        make_face()
        with BuildLine():
            ThreePointArc((19.7, 14.25), (17.95, 12.5), (19.7, 10.75))
            Line((19.7, 10.75), (19.7, 14.25))
        make_face()
        with BuildLine():
            Line((19.7, 14.25), (19.7, 10.75))
            ThreePointArc((19.7, 10.75), (20.937436867, 11.262563133), (21.45, 12.5))
            ThreePointArc((21.45, 12.5), (20.937436867, 13.737436867), (19.7, 14.25))
        make_face()
        with BuildLine():
            ThreePointArc((21.45, 12.5), (20.937436867, 11.262563133), (19.7, 10.75))
            Line((19.7, 10.75), (22, 10.75))
            Line((22, 10.75), (22, 14.25))
            Line((22, 14.25), (19.7, 14.25))
            ThreePointArc((19.7, 14.25), (20.937436867, 13.737436867), (21.45, 12.5))
        make_face()
    extrude(amount=BOSS_EXTRUDE4_DEPTH + BOSS_EXTRUDE4_DEPTH_BACK)


solid = part.part
